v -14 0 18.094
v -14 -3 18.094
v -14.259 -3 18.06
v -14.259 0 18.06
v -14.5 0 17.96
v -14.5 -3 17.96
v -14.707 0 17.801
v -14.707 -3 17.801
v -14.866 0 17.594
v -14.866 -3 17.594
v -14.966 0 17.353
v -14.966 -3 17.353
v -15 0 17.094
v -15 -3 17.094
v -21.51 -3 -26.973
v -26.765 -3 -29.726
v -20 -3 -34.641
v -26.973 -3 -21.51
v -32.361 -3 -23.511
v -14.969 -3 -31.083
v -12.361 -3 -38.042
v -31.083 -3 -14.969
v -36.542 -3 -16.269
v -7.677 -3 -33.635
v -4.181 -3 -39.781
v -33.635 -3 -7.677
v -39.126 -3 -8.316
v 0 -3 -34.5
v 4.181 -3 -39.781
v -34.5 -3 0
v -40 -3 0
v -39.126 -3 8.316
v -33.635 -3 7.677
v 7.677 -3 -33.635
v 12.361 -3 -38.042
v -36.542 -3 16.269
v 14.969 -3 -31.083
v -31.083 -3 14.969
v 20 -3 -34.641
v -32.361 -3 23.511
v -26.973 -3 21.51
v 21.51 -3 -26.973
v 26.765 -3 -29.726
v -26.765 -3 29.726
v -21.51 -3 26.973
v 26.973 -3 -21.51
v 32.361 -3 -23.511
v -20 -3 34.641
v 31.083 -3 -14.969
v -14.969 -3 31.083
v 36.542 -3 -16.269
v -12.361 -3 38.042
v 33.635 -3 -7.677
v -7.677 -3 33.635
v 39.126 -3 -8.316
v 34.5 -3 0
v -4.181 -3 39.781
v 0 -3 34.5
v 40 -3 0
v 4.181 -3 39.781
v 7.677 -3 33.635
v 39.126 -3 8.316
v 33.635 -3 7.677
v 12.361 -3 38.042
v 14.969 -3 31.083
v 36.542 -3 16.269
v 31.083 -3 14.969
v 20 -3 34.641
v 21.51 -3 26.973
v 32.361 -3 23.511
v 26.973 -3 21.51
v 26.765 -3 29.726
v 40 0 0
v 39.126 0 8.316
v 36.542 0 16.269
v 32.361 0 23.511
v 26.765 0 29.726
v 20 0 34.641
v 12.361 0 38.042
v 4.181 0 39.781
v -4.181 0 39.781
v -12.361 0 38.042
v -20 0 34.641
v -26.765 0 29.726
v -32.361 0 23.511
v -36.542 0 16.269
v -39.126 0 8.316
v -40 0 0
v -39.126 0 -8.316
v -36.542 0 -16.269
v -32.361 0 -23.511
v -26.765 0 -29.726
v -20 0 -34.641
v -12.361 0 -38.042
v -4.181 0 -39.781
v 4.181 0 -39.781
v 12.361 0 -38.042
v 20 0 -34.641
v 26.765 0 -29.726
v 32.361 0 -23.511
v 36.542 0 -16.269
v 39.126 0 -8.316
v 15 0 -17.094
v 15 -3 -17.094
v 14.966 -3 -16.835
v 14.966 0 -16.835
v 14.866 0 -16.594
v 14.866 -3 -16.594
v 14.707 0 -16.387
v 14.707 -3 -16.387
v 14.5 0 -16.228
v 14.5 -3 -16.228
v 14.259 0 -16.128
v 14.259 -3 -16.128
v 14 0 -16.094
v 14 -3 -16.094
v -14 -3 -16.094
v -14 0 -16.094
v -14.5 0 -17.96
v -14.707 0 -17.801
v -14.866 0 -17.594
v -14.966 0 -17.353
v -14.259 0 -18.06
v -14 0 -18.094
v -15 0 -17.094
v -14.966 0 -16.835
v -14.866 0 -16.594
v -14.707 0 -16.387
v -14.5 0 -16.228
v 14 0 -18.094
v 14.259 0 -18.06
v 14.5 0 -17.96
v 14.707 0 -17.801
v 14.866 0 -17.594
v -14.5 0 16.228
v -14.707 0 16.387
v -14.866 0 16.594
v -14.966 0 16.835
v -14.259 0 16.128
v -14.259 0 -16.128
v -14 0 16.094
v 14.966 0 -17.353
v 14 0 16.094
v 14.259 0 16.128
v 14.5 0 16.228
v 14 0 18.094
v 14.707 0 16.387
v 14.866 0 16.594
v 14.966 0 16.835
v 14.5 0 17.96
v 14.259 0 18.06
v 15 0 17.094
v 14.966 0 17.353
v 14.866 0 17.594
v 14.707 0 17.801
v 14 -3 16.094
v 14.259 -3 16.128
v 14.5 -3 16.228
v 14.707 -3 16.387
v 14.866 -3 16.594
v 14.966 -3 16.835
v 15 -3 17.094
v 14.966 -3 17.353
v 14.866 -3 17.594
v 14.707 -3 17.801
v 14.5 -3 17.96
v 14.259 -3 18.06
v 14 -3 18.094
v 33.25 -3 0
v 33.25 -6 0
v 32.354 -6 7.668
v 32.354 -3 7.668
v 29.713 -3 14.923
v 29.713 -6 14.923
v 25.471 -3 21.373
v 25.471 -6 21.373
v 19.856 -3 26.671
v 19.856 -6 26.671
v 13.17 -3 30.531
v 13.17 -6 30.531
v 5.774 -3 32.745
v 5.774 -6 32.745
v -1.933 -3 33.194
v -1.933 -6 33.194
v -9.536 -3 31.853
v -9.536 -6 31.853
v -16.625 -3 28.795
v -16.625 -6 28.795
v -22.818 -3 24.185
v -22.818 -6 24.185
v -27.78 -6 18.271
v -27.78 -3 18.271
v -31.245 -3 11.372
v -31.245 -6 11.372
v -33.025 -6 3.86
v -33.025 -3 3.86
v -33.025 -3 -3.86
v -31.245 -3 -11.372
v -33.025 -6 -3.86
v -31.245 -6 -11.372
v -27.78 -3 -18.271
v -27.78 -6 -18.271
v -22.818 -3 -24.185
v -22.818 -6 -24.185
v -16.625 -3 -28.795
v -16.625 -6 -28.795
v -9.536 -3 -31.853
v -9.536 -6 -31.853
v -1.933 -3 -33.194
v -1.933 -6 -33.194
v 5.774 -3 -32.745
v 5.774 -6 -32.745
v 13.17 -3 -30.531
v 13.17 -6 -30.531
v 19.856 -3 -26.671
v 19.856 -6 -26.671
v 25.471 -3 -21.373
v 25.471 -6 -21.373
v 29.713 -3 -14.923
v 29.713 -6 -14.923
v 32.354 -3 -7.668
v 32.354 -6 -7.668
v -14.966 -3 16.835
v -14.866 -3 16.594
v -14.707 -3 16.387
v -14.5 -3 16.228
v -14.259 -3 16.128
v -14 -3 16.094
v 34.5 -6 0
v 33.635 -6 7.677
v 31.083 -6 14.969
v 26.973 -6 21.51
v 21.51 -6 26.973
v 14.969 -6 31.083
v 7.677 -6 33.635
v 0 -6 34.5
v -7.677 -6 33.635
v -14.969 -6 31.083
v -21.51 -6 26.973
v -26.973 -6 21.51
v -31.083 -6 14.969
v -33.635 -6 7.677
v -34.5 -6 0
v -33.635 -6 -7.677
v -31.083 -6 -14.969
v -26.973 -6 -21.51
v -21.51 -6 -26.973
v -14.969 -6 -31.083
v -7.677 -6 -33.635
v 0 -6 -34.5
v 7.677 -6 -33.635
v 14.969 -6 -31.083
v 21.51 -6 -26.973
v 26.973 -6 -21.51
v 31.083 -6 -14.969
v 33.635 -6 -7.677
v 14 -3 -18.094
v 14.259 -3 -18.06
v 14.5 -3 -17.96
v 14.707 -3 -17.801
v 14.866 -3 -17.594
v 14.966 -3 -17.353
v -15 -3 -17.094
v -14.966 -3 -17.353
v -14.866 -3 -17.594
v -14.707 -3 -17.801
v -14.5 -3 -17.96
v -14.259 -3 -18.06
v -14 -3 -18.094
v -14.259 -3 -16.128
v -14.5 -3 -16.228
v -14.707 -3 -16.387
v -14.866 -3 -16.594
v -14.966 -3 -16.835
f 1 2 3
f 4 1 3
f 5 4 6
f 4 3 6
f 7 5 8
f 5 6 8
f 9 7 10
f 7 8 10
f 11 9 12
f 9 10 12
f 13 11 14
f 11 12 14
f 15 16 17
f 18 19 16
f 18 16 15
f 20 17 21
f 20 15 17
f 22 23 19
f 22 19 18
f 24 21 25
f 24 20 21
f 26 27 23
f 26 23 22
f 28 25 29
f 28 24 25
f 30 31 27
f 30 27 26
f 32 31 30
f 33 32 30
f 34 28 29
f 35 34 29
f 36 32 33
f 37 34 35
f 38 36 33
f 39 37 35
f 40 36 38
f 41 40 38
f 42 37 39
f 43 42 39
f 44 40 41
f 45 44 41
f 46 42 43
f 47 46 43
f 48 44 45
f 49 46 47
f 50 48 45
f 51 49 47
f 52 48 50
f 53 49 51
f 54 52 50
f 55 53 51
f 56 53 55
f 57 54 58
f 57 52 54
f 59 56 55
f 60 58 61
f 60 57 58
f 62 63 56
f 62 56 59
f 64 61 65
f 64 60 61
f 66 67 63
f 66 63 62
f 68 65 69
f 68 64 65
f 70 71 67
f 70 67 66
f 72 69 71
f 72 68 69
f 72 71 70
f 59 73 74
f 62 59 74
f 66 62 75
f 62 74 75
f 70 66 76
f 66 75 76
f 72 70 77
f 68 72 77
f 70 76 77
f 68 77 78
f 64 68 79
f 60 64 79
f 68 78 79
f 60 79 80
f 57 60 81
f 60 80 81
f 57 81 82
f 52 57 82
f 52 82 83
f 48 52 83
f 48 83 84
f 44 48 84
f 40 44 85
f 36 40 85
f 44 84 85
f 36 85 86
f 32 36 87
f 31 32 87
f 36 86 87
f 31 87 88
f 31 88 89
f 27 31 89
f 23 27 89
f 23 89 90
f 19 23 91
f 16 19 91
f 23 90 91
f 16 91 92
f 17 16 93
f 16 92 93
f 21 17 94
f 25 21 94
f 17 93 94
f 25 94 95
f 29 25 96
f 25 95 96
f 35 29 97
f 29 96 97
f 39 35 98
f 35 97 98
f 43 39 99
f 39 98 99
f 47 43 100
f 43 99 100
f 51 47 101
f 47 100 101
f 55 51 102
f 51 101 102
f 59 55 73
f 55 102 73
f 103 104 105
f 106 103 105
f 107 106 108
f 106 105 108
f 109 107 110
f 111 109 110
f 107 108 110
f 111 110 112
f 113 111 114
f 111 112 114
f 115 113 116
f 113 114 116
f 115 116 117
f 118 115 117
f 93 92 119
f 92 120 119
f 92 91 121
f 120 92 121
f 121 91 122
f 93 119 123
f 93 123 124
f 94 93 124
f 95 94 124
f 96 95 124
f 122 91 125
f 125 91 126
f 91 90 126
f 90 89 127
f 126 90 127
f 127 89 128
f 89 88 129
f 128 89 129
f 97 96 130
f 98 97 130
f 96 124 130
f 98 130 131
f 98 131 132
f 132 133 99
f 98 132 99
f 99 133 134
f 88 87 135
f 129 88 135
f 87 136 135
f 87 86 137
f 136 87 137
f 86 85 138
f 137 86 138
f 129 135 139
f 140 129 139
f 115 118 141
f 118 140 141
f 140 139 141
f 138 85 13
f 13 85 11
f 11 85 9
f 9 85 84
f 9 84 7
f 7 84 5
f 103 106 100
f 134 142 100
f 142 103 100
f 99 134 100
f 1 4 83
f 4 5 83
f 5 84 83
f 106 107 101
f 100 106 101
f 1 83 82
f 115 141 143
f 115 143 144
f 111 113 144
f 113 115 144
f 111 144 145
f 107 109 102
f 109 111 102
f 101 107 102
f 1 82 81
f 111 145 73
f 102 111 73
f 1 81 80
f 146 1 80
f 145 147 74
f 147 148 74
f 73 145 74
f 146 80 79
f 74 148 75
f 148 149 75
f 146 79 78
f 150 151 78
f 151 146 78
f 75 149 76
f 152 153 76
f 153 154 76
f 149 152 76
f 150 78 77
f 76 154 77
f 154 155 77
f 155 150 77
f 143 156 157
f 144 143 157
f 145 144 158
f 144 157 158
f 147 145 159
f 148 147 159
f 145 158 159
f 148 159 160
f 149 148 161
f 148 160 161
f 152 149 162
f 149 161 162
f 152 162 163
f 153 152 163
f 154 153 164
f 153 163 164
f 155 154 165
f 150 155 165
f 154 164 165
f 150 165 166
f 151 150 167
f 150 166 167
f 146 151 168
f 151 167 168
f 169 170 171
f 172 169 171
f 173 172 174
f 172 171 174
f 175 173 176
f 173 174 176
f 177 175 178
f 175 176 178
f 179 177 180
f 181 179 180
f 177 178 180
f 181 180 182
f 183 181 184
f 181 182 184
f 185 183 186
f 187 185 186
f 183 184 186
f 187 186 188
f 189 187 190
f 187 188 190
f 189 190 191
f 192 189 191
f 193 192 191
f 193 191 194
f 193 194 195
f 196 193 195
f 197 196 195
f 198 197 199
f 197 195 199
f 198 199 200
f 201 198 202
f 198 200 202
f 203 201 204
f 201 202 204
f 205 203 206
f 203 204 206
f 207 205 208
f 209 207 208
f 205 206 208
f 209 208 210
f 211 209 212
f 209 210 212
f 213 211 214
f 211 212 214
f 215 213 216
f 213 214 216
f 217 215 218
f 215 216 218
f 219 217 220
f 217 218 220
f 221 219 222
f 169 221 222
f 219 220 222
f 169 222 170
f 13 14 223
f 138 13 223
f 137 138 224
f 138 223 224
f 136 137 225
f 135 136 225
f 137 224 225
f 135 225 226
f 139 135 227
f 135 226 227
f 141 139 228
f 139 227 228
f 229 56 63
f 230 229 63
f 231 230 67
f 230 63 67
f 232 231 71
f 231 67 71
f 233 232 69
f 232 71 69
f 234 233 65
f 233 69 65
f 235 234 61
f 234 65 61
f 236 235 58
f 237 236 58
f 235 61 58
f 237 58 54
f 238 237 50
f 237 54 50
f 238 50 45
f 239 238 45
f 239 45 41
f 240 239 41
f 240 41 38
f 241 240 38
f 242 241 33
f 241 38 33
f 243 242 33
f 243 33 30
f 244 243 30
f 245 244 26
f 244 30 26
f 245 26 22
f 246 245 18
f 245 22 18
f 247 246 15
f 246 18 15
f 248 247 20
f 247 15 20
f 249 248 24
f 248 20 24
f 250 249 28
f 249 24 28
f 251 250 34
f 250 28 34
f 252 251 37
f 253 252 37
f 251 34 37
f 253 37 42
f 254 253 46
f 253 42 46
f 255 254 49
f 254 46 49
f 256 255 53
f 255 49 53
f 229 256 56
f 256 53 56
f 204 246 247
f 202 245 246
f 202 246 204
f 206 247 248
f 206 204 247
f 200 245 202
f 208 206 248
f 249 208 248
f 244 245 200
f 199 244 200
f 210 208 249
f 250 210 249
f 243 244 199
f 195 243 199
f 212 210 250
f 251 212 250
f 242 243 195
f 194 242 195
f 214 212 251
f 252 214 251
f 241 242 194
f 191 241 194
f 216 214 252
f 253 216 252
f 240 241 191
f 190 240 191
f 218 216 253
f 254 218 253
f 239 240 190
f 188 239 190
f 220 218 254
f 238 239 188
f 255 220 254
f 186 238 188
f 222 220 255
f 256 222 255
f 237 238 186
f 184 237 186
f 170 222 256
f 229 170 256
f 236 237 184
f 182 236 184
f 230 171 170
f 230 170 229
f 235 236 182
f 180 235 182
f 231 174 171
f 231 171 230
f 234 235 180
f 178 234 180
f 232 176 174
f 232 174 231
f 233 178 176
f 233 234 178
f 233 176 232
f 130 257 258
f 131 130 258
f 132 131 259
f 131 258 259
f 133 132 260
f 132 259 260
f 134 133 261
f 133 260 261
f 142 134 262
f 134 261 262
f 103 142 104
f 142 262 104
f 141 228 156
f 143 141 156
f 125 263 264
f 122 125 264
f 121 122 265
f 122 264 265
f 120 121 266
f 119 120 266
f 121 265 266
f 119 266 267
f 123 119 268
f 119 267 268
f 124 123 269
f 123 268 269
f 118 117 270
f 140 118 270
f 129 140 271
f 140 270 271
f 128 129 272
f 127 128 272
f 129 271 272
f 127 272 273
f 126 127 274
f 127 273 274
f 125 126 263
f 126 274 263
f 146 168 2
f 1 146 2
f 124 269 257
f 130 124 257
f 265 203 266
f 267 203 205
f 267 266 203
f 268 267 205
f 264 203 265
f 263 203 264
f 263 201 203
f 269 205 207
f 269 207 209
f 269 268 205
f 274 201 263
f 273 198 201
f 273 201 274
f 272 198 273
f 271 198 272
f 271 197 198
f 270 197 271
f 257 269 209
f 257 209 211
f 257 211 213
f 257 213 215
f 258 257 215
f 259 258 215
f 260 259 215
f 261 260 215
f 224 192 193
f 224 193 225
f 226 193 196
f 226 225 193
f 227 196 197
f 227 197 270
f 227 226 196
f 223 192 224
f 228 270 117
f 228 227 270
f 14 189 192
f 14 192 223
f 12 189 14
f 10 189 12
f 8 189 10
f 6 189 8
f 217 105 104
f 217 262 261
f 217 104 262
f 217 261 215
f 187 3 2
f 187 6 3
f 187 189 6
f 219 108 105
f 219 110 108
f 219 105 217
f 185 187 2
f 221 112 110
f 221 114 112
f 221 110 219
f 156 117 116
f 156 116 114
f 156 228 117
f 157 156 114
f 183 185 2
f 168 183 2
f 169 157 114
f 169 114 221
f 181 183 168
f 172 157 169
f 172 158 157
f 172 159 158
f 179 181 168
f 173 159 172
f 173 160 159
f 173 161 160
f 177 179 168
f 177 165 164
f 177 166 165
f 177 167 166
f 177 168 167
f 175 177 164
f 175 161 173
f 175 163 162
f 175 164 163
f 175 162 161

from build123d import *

# Parameters (mm, degrees)
F0_R     = 40
F1_DEPTH = 3
F2_R     = 34.5
F3_DEPTH = 3
F4_R     = 33.25
F5_DEPTH = 3
F7_DEPTH = 3.001


with BuildPart() as f1:
    # F0 (on Front) → F1 (new body)
    with BuildSketch(Plane.XZ):
        Circle(F0_R)
    extrude(amount=F1_DEPTH)

    # F2 (on face) → F3 (join)
    with BuildSketch(Plane.XZ.offset(3)):
        Circle(F2_R)
    extrude(amount=F3_DEPTH)

    # F4 (on face) → F5 (cut)
    with BuildSketch(Plane.XZ.offset(6)):
        Circle(F4_R)
    extrude(amount=-F5_DEPTH, mode=Mode.SUBTRACT)

    # F6 (on face) → F7 (cut, through all)
    with BuildSketch(Plane.XZ.offset(3)):
        with BuildLine():
            Line((14, 18.093938), (-14, 18.093938))
            ThreePointArc((-14, 18.093938), (-14.707107, 17.801045), (-15, 17.093938))
            ThreePointArc((-15, 17.093938), (-14.707107, 16.386831), (-14, 16.093938))
            Line((-14, 16.093938), (14, 16.093938))
            ThreePointArc((14, 16.093938), (14.707107, 16.386831), (15, 17.093938))
            ThreePointArc((15, 17.093938), (14.707107, 17.801045), (14, 18.093938))
        make_face()
        with BuildLine():
            Line((14, -16.093938), (-14, -16.093938))
            ThreePointArc((-14, -16.093938), (-14.707107, -16.386831), (-15, -17.093938))
            ThreePointArc((-15, -17.093938), (-14.707107, -17.801045), (-14, -18.093938))
            Line((-14, -18.093938), (14, -18.093938))
            ThreePointArc((14, -18.093938), (14.707107, -17.801045), (15, -17.093938))
            ThreePointArc((15, -17.093938), (14.707107, -16.386831), (14, -16.093938))
        make_face()
    extrude(amount=-F7_DEPTH, mode=Mode.SUBTRACT)


solid = f1.part
